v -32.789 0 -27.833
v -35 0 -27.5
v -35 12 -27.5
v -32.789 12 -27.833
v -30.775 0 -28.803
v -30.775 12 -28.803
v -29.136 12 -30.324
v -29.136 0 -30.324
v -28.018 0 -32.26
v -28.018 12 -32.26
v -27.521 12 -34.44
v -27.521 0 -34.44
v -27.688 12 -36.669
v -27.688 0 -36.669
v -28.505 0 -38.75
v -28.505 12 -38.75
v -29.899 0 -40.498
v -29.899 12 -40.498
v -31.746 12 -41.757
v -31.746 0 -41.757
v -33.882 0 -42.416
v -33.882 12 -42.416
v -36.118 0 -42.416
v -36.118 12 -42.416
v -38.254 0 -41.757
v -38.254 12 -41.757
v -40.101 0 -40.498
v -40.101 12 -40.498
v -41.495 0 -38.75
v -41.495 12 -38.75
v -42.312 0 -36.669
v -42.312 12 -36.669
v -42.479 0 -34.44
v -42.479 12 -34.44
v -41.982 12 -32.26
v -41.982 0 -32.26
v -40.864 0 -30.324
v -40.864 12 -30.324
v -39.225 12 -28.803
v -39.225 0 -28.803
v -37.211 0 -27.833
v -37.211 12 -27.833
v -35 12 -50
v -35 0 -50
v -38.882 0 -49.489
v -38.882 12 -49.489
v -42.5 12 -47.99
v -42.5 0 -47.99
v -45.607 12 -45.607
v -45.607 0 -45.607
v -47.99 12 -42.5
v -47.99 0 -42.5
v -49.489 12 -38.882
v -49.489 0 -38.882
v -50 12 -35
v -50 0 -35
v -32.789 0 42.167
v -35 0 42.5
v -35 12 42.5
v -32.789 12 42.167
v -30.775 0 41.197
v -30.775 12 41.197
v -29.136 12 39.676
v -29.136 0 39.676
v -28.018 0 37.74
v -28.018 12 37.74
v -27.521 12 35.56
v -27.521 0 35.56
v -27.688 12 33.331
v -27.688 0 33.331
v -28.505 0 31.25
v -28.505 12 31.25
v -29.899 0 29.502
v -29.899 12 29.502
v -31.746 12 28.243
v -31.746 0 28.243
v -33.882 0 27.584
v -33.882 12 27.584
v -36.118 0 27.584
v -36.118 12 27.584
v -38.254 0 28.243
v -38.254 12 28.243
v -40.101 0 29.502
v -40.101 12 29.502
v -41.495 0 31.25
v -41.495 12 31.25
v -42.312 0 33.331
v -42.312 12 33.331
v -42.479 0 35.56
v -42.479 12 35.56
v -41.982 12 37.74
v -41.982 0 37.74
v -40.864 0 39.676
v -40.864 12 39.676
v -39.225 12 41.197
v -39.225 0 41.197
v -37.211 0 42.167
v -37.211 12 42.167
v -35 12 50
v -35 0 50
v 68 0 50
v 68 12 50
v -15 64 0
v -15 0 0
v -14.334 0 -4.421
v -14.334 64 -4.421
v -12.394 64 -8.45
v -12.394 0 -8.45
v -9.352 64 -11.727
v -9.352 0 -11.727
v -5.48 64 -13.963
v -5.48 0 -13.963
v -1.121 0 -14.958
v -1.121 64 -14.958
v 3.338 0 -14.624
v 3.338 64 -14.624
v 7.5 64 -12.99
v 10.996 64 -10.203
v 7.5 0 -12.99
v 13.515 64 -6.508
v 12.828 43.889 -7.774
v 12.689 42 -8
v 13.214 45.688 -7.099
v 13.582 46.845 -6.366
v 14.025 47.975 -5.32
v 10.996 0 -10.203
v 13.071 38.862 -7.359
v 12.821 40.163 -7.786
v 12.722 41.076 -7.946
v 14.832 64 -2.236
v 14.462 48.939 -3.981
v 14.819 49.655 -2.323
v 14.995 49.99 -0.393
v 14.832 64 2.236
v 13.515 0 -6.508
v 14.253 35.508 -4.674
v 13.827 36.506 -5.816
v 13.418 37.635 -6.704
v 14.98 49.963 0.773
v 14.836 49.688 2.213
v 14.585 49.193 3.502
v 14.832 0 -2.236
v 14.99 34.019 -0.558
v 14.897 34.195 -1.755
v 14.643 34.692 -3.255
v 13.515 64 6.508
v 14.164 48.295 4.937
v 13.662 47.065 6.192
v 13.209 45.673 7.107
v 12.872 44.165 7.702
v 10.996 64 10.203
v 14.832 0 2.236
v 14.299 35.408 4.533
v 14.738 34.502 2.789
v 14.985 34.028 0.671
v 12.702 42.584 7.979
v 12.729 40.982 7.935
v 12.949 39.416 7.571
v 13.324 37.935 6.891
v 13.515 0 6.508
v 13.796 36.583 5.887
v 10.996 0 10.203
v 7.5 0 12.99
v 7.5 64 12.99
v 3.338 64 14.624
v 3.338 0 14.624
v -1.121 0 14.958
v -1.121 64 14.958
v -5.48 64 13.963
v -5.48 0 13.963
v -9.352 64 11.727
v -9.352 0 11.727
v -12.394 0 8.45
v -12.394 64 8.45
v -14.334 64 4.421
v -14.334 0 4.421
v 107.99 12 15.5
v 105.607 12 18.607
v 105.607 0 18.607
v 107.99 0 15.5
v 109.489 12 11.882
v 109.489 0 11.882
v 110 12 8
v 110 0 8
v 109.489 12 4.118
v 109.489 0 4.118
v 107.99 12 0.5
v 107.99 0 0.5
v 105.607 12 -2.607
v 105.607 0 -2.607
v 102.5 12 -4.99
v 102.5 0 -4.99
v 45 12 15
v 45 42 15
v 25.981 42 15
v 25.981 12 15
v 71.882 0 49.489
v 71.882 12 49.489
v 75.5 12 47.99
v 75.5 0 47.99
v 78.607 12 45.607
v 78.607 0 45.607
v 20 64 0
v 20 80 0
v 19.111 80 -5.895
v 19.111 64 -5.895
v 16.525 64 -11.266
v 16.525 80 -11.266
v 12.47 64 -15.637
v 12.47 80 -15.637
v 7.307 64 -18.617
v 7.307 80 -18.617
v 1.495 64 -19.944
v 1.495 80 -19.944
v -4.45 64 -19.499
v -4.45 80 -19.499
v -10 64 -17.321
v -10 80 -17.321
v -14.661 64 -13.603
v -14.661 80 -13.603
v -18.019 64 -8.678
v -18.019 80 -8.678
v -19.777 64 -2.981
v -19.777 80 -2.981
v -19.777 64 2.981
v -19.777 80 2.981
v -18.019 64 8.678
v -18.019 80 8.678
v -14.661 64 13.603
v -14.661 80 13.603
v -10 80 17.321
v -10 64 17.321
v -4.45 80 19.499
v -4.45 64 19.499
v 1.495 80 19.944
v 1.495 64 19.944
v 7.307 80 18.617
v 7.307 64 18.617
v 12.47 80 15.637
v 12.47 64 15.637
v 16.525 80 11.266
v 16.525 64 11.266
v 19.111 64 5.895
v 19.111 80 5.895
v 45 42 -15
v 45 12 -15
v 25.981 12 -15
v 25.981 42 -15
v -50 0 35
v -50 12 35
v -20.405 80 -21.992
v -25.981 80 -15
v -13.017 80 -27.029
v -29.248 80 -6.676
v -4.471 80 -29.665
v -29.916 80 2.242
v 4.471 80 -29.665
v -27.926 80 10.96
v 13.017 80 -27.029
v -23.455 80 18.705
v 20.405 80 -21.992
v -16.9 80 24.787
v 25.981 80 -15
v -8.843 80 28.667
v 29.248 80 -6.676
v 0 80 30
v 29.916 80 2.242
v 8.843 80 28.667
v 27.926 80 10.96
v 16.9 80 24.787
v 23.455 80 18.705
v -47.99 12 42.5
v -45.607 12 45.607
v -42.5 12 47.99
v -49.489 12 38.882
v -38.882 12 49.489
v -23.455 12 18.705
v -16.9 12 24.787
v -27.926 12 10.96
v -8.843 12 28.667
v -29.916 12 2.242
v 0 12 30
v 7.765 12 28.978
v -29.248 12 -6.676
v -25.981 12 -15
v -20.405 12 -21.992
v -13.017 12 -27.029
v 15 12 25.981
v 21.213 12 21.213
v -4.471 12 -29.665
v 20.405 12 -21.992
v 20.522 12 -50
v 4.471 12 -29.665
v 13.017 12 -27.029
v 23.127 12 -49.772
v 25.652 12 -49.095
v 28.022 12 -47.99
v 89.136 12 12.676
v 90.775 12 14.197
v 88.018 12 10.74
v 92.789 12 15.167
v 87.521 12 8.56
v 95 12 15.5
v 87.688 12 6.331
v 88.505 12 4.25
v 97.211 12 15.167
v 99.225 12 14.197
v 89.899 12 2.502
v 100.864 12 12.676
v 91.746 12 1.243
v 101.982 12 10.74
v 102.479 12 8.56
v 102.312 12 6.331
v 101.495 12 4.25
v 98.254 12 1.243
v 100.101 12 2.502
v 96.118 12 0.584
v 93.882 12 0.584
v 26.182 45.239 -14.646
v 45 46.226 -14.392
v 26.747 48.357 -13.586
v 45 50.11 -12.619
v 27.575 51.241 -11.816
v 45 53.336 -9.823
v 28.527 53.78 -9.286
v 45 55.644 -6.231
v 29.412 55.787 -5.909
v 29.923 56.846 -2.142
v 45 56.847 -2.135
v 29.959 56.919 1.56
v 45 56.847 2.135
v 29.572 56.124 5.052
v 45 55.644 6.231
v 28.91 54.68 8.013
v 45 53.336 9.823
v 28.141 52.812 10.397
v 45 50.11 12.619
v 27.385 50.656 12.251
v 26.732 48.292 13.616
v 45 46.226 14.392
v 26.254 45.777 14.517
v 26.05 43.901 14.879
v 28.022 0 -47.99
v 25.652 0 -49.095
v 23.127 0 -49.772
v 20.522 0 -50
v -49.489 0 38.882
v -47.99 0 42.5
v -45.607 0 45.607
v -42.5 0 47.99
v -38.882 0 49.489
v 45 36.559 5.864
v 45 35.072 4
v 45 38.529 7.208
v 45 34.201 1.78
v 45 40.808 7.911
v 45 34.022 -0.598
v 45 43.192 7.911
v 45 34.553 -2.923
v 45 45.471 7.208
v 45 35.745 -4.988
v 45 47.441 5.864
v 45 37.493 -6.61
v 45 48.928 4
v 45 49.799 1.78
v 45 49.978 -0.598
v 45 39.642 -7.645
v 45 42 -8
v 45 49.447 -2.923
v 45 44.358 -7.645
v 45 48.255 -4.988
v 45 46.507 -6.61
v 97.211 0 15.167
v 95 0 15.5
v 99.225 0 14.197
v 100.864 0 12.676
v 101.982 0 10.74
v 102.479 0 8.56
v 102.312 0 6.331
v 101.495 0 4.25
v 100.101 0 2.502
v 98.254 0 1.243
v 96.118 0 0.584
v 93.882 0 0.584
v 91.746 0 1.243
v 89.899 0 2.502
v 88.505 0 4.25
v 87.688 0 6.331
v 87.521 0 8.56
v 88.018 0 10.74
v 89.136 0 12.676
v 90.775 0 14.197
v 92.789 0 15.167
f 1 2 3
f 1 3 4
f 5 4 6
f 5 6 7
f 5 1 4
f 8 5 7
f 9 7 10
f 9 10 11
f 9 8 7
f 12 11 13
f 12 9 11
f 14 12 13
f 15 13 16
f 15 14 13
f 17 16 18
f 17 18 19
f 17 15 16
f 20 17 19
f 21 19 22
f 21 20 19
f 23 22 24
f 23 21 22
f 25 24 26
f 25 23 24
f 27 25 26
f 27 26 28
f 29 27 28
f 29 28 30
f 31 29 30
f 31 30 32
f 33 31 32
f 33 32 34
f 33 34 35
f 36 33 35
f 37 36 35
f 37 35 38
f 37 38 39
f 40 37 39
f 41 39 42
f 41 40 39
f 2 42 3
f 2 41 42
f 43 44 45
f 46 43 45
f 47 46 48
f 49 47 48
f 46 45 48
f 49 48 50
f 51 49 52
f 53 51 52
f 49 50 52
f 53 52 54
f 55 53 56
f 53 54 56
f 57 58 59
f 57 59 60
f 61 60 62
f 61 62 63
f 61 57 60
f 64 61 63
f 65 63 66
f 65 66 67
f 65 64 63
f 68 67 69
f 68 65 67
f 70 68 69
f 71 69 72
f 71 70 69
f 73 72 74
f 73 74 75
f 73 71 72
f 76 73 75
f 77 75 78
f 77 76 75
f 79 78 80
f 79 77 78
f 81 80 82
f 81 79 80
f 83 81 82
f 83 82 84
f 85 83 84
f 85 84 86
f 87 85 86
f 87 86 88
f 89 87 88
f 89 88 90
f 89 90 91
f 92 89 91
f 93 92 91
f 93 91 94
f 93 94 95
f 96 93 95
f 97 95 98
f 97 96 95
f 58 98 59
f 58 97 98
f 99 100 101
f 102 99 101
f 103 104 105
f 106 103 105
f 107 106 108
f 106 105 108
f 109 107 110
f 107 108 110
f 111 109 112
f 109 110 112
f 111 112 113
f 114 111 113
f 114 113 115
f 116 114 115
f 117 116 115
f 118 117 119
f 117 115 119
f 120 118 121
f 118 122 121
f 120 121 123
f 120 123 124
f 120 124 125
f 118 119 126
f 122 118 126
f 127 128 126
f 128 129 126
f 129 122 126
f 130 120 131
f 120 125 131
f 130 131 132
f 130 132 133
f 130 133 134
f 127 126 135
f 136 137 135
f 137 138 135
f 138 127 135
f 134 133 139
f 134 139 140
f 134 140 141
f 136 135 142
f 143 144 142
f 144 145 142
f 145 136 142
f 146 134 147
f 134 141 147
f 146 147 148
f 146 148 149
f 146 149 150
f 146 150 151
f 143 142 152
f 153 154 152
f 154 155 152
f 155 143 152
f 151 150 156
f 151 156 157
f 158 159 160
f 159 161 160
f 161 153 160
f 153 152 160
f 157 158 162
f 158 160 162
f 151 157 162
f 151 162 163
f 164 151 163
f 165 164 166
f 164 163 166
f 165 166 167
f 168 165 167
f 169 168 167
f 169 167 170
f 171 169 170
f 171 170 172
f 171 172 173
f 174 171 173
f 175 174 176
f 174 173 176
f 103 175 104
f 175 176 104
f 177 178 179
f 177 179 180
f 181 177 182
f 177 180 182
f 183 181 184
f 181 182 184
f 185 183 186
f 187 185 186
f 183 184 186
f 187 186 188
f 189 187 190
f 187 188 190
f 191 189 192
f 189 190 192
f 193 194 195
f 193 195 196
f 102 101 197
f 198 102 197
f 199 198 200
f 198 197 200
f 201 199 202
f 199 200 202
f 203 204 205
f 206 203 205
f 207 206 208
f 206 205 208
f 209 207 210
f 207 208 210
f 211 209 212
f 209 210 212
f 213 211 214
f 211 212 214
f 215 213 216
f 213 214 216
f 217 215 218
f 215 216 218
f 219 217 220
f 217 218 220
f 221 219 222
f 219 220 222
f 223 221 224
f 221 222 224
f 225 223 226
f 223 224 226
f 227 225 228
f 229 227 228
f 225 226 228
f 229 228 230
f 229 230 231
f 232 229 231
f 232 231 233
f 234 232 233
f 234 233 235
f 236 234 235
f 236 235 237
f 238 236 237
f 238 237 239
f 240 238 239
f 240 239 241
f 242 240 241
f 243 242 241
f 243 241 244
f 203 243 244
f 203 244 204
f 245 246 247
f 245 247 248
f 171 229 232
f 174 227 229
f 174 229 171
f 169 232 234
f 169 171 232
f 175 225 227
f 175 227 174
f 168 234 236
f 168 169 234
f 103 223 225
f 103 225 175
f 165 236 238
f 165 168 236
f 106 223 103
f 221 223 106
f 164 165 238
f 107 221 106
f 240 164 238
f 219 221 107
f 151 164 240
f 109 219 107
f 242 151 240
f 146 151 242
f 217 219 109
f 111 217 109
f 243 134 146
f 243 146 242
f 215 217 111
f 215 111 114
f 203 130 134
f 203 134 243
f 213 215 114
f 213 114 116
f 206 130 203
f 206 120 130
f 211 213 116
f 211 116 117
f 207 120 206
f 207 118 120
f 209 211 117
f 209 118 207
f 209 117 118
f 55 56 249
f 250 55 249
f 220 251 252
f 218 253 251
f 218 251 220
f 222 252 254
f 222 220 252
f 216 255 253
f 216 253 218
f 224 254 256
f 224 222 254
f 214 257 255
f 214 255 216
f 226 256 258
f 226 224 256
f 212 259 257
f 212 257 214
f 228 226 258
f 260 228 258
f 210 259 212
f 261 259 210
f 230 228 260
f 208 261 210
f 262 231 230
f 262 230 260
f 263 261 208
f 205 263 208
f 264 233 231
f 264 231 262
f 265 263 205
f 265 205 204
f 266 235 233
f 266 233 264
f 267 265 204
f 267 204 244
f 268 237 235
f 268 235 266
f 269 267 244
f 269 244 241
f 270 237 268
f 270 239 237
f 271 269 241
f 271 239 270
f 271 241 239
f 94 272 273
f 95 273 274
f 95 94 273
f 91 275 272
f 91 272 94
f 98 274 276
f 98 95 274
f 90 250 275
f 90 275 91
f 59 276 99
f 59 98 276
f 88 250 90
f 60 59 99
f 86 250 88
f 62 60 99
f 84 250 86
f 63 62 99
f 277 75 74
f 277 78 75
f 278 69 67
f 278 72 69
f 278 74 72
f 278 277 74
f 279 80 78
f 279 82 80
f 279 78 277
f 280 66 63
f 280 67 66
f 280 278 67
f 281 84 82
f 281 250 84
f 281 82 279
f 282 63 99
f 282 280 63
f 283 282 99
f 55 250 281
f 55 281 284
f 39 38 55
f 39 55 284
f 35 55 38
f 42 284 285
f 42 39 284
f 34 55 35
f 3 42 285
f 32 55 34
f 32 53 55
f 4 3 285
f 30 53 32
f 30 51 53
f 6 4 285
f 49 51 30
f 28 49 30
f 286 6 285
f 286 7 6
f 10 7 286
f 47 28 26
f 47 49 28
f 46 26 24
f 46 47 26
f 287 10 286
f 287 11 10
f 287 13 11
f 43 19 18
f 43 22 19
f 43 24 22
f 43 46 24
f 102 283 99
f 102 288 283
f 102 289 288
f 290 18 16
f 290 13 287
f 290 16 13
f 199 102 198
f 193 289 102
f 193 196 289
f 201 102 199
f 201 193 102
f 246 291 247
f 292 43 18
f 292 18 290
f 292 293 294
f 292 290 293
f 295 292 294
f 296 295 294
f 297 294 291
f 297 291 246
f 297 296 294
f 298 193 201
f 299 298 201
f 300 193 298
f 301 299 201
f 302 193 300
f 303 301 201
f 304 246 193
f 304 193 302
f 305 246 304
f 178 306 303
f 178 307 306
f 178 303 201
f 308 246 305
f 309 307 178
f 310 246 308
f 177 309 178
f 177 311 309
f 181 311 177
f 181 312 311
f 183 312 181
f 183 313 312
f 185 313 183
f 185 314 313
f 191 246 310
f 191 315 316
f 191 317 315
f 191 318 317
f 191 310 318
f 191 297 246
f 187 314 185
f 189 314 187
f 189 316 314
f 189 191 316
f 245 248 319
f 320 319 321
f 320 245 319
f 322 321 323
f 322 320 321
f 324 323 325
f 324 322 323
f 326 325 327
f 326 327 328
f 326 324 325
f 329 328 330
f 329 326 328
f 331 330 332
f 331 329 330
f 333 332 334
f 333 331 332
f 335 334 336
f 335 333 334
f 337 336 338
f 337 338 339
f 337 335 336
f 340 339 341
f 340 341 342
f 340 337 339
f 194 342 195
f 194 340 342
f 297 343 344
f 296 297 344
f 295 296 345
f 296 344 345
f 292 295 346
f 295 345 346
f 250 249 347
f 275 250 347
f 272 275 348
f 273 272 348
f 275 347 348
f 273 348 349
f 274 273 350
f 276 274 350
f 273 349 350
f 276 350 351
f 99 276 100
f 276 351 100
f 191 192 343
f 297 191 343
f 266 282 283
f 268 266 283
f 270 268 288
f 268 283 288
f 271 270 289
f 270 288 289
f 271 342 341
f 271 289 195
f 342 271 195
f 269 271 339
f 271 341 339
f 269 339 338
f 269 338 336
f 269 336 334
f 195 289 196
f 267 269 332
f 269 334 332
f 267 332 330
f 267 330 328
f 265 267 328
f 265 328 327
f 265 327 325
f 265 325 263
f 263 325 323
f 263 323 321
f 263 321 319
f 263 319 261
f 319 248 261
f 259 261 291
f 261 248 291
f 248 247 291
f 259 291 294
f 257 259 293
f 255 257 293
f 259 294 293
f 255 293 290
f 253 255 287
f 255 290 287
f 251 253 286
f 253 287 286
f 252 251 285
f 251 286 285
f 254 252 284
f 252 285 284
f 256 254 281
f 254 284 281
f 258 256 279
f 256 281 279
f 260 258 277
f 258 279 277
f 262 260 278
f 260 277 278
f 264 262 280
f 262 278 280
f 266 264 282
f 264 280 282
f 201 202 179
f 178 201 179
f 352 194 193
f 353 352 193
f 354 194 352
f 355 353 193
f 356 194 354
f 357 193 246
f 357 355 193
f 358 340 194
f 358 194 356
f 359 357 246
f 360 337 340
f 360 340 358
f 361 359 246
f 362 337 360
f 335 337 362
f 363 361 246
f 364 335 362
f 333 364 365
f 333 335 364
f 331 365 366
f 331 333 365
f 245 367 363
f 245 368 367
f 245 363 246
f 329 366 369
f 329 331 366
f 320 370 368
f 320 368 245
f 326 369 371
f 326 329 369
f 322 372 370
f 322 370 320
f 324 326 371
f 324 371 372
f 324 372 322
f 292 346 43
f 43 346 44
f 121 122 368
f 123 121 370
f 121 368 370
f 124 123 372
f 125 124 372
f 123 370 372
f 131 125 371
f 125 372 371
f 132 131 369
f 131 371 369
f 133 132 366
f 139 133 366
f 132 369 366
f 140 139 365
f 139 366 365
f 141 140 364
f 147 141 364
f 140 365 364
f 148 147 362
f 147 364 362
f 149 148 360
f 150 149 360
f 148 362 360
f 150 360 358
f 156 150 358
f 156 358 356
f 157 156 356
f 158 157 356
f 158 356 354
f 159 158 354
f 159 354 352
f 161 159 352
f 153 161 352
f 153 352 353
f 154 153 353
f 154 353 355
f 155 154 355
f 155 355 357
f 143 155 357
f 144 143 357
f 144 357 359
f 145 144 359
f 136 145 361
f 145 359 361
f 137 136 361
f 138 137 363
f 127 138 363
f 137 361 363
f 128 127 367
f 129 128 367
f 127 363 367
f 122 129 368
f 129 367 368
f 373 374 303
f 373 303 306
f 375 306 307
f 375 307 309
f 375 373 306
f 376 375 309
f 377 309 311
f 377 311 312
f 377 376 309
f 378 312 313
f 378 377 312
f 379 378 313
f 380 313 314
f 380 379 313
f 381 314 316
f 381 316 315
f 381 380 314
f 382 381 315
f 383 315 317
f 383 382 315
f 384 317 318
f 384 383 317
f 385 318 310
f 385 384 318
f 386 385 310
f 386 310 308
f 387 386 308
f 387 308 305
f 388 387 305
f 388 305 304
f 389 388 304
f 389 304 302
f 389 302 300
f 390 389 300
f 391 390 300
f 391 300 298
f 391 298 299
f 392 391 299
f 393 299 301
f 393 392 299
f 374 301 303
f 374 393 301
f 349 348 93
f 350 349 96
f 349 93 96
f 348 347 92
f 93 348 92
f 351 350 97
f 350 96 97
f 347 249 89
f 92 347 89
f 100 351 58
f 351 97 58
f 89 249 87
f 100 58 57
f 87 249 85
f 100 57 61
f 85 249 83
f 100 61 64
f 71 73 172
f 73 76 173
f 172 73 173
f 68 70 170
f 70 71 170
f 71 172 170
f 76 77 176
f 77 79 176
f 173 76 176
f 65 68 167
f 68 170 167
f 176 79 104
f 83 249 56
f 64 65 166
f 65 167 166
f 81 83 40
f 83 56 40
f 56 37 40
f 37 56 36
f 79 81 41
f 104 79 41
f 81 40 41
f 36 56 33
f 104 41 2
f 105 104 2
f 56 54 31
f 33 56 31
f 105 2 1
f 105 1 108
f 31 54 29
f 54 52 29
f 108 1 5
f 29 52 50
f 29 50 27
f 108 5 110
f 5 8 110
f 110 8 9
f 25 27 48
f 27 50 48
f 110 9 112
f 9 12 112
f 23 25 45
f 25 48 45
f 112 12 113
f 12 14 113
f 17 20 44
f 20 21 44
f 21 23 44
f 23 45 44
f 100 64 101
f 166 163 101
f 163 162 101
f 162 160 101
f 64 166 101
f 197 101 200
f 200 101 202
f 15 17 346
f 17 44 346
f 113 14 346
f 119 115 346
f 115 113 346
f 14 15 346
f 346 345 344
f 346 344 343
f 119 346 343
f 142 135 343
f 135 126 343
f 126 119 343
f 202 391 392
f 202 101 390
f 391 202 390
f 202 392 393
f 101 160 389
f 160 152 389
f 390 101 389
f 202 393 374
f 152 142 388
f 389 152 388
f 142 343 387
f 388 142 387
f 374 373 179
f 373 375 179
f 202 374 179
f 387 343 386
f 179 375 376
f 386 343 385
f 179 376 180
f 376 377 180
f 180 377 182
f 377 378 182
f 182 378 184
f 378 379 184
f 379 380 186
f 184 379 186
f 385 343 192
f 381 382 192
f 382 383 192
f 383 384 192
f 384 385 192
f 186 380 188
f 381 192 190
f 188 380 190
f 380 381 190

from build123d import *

# Parameters (mm, degrees)
SKETCH1_R                = 7.5
BOSS_EXTRUDE1_DEPTH      = 12
SKETCH3_R                = 30
BOSS_EXTRUDE2_DEPTH      = 68
HOLE1_D                  = 30
HOLE1_DEPTH              = 80
HOLE1_CBORE_D            = 40
HOLE1_CBORE_DEPTH        = 16
HOLE1_TIP                = 9.012909285
BOSS_EXTRUDE3_REACH      = 135.884
BOSS_EXTRUDE3_END_RADIUS = 30
CUT_EXTRUDE1_REACH       = 135.884
CUT_EXTRUDE1_END_RADIUS  = 15
SKETCH11_R               = 8


with BuildPart() as part:
    # Sketch1 → Boss-Extrude1 (new body)
    with BuildSketch(Plane(origin=(0, 0, 0), x_dir=(1, 0, 0), z_dir=(0, 1, 0))):
        with BuildLine():
            Line((-50, 35), (-50, -35))
            ThreePointArc((-50, -35), (-45.606601718, -45.606601718), (-35, -50))
            Line((-35, -50), (68, -50))
            ThreePointArc((68, -50), (73.740251485, -48.858192988), (78.606601718, -45.606601718))
            Line((78.606601718, -45.606601718), (105.606601718, -18.606601718))
            ThreePointArc((105.606601718, -18.606601718), (109.871672921, -6.042107117), (102.5, 4.990381057))
            Line((102.5, 4.990381057), (28.021815275, 47.990381057))
            ThreePointArc((28.021815275, 47.990381057), (24.404100951, 49.488887394), (20.521815275, 50))
            Line((20.521815275, 50), (-35, 50))
            ThreePointArc((-35, 50), (-45.606601718, 45.606601718), (-50, 35))
        make_face()
        with Locations(Location((95, -8, 0), (0, 0, 270))):
            Circle(SKETCH1_R, mode=Mode.SUBTRACT)
        with Locations(Location((-35, 35, 0), (0, 0, 270))):
            Circle(SKETCH1_R, mode=Mode.SUBTRACT)
        with Locations(Location((-35, -35, 0), (0, 0, 270))):
            Circle(SKETCH1_R, mode=Mode.SUBTRACT)
    extrude(amount=BOSS_EXTRUDE1_DEPTH)

    # Sketch3 → Boss-Extrude2 (add)
    with BuildSketch(Plane(origin=(0, 12, 0), x_dir=(1, 0, 0), z_dir=(0, 1, 0))):
        with Locations(Location((0, 0, 0), (0, 0, 270))):
            Circle(SKETCH3_R)
    extrude(amount=BOSS_EXTRUDE2_DEPTH)

    # Hole1
    with Locations(Plane(origin=(0, 80, 0), x_dir=(1, 0, 0), z_dir=(0, 1, 0))):
        with Locations((0, 0)):
            CounterBoreHole(HOLE1_D / 2, HOLE1_CBORE_D / 2, HOLE1_CBORE_DEPTH, depth=HOLE1_DEPTH)
            with Locations((0, 0, -(HOLE1_DEPTH + HOLE1_TIP / 2))):  # 118° drill point
                Cone(0, HOLE1_D / 2, HOLE1_TIP, mode=Mode.SUBTRACT)

    # Boss-Extrude3: up to this cylinder (the profile starts outside it)
    boss_extrude3_end = Plane(origin=(0, 33.024623, 0), z_dir=(0, -1, 0)) * Cylinder(BOSS_EXTRUDE3_END_RADIUS, 332.768, mode=Mode.PRIVATE)
    # Sketch10 → Boss-Extrude3 (add, up to the surface)
    with BuildSketch(Plane(origin=(45, 0, 0), x_dir=(0, 0, -1), z_dir=(1, 0, 0)), mode=Mode.PRIVATE) as boss_extrude3_sk1:
        with BuildLine():
            Line((-15, 42), (-15, 12))
            Line((-15, 12), (15, 12))
            Line((15, 12), (15, 42))
            ThreePointArc((15, 42), (0, 57), (-15, 42))
        make_face()
    boss_extrude3_tool1 = extrude(boss_extrude3_sk1.sketch, amount=-BOSS_EXTRUDE3_REACH, mode=Mode.PRIVATE) - boss_extrude3_end
    add(boss_extrude3_tool1.solids().sort_by_distance((45, 33.024623, 0))[0])

    # Cut-Extrude1: up to this cylinder (the profile starts outside it)
    cut_extrude1_end = Plane(origin=(0, 42, 0), z_dir=(0, 1, 0)) * Cylinder(CUT_EXTRUDE1_END_RADIUS, 302.768, mode=Mode.PRIVATE)
    # Sketch11 → Cut-Extrude1 (cut, up to the surface)
    with BuildSketch(Plane(origin=(45, 0, 0), x_dir=(0, 0, -1), z_dir=(1, 0, 0)), mode=Mode.PRIVATE) as cut_extrude1_sk1:
        with Locations((0, 42)):
            Circle(SKETCH11_R)
    cut_extrude1_tool1 = extrude(cut_extrude1_sk1.sketch, amount=-CUT_EXTRUDE1_REACH, mode=Mode.PRIVATE) - cut_extrude1_end
    add(cut_extrude1_tool1.solids().sort_by_distance((45, 42, 0))[0], mode=Mode.SUBTRACT)


solid = part.part
